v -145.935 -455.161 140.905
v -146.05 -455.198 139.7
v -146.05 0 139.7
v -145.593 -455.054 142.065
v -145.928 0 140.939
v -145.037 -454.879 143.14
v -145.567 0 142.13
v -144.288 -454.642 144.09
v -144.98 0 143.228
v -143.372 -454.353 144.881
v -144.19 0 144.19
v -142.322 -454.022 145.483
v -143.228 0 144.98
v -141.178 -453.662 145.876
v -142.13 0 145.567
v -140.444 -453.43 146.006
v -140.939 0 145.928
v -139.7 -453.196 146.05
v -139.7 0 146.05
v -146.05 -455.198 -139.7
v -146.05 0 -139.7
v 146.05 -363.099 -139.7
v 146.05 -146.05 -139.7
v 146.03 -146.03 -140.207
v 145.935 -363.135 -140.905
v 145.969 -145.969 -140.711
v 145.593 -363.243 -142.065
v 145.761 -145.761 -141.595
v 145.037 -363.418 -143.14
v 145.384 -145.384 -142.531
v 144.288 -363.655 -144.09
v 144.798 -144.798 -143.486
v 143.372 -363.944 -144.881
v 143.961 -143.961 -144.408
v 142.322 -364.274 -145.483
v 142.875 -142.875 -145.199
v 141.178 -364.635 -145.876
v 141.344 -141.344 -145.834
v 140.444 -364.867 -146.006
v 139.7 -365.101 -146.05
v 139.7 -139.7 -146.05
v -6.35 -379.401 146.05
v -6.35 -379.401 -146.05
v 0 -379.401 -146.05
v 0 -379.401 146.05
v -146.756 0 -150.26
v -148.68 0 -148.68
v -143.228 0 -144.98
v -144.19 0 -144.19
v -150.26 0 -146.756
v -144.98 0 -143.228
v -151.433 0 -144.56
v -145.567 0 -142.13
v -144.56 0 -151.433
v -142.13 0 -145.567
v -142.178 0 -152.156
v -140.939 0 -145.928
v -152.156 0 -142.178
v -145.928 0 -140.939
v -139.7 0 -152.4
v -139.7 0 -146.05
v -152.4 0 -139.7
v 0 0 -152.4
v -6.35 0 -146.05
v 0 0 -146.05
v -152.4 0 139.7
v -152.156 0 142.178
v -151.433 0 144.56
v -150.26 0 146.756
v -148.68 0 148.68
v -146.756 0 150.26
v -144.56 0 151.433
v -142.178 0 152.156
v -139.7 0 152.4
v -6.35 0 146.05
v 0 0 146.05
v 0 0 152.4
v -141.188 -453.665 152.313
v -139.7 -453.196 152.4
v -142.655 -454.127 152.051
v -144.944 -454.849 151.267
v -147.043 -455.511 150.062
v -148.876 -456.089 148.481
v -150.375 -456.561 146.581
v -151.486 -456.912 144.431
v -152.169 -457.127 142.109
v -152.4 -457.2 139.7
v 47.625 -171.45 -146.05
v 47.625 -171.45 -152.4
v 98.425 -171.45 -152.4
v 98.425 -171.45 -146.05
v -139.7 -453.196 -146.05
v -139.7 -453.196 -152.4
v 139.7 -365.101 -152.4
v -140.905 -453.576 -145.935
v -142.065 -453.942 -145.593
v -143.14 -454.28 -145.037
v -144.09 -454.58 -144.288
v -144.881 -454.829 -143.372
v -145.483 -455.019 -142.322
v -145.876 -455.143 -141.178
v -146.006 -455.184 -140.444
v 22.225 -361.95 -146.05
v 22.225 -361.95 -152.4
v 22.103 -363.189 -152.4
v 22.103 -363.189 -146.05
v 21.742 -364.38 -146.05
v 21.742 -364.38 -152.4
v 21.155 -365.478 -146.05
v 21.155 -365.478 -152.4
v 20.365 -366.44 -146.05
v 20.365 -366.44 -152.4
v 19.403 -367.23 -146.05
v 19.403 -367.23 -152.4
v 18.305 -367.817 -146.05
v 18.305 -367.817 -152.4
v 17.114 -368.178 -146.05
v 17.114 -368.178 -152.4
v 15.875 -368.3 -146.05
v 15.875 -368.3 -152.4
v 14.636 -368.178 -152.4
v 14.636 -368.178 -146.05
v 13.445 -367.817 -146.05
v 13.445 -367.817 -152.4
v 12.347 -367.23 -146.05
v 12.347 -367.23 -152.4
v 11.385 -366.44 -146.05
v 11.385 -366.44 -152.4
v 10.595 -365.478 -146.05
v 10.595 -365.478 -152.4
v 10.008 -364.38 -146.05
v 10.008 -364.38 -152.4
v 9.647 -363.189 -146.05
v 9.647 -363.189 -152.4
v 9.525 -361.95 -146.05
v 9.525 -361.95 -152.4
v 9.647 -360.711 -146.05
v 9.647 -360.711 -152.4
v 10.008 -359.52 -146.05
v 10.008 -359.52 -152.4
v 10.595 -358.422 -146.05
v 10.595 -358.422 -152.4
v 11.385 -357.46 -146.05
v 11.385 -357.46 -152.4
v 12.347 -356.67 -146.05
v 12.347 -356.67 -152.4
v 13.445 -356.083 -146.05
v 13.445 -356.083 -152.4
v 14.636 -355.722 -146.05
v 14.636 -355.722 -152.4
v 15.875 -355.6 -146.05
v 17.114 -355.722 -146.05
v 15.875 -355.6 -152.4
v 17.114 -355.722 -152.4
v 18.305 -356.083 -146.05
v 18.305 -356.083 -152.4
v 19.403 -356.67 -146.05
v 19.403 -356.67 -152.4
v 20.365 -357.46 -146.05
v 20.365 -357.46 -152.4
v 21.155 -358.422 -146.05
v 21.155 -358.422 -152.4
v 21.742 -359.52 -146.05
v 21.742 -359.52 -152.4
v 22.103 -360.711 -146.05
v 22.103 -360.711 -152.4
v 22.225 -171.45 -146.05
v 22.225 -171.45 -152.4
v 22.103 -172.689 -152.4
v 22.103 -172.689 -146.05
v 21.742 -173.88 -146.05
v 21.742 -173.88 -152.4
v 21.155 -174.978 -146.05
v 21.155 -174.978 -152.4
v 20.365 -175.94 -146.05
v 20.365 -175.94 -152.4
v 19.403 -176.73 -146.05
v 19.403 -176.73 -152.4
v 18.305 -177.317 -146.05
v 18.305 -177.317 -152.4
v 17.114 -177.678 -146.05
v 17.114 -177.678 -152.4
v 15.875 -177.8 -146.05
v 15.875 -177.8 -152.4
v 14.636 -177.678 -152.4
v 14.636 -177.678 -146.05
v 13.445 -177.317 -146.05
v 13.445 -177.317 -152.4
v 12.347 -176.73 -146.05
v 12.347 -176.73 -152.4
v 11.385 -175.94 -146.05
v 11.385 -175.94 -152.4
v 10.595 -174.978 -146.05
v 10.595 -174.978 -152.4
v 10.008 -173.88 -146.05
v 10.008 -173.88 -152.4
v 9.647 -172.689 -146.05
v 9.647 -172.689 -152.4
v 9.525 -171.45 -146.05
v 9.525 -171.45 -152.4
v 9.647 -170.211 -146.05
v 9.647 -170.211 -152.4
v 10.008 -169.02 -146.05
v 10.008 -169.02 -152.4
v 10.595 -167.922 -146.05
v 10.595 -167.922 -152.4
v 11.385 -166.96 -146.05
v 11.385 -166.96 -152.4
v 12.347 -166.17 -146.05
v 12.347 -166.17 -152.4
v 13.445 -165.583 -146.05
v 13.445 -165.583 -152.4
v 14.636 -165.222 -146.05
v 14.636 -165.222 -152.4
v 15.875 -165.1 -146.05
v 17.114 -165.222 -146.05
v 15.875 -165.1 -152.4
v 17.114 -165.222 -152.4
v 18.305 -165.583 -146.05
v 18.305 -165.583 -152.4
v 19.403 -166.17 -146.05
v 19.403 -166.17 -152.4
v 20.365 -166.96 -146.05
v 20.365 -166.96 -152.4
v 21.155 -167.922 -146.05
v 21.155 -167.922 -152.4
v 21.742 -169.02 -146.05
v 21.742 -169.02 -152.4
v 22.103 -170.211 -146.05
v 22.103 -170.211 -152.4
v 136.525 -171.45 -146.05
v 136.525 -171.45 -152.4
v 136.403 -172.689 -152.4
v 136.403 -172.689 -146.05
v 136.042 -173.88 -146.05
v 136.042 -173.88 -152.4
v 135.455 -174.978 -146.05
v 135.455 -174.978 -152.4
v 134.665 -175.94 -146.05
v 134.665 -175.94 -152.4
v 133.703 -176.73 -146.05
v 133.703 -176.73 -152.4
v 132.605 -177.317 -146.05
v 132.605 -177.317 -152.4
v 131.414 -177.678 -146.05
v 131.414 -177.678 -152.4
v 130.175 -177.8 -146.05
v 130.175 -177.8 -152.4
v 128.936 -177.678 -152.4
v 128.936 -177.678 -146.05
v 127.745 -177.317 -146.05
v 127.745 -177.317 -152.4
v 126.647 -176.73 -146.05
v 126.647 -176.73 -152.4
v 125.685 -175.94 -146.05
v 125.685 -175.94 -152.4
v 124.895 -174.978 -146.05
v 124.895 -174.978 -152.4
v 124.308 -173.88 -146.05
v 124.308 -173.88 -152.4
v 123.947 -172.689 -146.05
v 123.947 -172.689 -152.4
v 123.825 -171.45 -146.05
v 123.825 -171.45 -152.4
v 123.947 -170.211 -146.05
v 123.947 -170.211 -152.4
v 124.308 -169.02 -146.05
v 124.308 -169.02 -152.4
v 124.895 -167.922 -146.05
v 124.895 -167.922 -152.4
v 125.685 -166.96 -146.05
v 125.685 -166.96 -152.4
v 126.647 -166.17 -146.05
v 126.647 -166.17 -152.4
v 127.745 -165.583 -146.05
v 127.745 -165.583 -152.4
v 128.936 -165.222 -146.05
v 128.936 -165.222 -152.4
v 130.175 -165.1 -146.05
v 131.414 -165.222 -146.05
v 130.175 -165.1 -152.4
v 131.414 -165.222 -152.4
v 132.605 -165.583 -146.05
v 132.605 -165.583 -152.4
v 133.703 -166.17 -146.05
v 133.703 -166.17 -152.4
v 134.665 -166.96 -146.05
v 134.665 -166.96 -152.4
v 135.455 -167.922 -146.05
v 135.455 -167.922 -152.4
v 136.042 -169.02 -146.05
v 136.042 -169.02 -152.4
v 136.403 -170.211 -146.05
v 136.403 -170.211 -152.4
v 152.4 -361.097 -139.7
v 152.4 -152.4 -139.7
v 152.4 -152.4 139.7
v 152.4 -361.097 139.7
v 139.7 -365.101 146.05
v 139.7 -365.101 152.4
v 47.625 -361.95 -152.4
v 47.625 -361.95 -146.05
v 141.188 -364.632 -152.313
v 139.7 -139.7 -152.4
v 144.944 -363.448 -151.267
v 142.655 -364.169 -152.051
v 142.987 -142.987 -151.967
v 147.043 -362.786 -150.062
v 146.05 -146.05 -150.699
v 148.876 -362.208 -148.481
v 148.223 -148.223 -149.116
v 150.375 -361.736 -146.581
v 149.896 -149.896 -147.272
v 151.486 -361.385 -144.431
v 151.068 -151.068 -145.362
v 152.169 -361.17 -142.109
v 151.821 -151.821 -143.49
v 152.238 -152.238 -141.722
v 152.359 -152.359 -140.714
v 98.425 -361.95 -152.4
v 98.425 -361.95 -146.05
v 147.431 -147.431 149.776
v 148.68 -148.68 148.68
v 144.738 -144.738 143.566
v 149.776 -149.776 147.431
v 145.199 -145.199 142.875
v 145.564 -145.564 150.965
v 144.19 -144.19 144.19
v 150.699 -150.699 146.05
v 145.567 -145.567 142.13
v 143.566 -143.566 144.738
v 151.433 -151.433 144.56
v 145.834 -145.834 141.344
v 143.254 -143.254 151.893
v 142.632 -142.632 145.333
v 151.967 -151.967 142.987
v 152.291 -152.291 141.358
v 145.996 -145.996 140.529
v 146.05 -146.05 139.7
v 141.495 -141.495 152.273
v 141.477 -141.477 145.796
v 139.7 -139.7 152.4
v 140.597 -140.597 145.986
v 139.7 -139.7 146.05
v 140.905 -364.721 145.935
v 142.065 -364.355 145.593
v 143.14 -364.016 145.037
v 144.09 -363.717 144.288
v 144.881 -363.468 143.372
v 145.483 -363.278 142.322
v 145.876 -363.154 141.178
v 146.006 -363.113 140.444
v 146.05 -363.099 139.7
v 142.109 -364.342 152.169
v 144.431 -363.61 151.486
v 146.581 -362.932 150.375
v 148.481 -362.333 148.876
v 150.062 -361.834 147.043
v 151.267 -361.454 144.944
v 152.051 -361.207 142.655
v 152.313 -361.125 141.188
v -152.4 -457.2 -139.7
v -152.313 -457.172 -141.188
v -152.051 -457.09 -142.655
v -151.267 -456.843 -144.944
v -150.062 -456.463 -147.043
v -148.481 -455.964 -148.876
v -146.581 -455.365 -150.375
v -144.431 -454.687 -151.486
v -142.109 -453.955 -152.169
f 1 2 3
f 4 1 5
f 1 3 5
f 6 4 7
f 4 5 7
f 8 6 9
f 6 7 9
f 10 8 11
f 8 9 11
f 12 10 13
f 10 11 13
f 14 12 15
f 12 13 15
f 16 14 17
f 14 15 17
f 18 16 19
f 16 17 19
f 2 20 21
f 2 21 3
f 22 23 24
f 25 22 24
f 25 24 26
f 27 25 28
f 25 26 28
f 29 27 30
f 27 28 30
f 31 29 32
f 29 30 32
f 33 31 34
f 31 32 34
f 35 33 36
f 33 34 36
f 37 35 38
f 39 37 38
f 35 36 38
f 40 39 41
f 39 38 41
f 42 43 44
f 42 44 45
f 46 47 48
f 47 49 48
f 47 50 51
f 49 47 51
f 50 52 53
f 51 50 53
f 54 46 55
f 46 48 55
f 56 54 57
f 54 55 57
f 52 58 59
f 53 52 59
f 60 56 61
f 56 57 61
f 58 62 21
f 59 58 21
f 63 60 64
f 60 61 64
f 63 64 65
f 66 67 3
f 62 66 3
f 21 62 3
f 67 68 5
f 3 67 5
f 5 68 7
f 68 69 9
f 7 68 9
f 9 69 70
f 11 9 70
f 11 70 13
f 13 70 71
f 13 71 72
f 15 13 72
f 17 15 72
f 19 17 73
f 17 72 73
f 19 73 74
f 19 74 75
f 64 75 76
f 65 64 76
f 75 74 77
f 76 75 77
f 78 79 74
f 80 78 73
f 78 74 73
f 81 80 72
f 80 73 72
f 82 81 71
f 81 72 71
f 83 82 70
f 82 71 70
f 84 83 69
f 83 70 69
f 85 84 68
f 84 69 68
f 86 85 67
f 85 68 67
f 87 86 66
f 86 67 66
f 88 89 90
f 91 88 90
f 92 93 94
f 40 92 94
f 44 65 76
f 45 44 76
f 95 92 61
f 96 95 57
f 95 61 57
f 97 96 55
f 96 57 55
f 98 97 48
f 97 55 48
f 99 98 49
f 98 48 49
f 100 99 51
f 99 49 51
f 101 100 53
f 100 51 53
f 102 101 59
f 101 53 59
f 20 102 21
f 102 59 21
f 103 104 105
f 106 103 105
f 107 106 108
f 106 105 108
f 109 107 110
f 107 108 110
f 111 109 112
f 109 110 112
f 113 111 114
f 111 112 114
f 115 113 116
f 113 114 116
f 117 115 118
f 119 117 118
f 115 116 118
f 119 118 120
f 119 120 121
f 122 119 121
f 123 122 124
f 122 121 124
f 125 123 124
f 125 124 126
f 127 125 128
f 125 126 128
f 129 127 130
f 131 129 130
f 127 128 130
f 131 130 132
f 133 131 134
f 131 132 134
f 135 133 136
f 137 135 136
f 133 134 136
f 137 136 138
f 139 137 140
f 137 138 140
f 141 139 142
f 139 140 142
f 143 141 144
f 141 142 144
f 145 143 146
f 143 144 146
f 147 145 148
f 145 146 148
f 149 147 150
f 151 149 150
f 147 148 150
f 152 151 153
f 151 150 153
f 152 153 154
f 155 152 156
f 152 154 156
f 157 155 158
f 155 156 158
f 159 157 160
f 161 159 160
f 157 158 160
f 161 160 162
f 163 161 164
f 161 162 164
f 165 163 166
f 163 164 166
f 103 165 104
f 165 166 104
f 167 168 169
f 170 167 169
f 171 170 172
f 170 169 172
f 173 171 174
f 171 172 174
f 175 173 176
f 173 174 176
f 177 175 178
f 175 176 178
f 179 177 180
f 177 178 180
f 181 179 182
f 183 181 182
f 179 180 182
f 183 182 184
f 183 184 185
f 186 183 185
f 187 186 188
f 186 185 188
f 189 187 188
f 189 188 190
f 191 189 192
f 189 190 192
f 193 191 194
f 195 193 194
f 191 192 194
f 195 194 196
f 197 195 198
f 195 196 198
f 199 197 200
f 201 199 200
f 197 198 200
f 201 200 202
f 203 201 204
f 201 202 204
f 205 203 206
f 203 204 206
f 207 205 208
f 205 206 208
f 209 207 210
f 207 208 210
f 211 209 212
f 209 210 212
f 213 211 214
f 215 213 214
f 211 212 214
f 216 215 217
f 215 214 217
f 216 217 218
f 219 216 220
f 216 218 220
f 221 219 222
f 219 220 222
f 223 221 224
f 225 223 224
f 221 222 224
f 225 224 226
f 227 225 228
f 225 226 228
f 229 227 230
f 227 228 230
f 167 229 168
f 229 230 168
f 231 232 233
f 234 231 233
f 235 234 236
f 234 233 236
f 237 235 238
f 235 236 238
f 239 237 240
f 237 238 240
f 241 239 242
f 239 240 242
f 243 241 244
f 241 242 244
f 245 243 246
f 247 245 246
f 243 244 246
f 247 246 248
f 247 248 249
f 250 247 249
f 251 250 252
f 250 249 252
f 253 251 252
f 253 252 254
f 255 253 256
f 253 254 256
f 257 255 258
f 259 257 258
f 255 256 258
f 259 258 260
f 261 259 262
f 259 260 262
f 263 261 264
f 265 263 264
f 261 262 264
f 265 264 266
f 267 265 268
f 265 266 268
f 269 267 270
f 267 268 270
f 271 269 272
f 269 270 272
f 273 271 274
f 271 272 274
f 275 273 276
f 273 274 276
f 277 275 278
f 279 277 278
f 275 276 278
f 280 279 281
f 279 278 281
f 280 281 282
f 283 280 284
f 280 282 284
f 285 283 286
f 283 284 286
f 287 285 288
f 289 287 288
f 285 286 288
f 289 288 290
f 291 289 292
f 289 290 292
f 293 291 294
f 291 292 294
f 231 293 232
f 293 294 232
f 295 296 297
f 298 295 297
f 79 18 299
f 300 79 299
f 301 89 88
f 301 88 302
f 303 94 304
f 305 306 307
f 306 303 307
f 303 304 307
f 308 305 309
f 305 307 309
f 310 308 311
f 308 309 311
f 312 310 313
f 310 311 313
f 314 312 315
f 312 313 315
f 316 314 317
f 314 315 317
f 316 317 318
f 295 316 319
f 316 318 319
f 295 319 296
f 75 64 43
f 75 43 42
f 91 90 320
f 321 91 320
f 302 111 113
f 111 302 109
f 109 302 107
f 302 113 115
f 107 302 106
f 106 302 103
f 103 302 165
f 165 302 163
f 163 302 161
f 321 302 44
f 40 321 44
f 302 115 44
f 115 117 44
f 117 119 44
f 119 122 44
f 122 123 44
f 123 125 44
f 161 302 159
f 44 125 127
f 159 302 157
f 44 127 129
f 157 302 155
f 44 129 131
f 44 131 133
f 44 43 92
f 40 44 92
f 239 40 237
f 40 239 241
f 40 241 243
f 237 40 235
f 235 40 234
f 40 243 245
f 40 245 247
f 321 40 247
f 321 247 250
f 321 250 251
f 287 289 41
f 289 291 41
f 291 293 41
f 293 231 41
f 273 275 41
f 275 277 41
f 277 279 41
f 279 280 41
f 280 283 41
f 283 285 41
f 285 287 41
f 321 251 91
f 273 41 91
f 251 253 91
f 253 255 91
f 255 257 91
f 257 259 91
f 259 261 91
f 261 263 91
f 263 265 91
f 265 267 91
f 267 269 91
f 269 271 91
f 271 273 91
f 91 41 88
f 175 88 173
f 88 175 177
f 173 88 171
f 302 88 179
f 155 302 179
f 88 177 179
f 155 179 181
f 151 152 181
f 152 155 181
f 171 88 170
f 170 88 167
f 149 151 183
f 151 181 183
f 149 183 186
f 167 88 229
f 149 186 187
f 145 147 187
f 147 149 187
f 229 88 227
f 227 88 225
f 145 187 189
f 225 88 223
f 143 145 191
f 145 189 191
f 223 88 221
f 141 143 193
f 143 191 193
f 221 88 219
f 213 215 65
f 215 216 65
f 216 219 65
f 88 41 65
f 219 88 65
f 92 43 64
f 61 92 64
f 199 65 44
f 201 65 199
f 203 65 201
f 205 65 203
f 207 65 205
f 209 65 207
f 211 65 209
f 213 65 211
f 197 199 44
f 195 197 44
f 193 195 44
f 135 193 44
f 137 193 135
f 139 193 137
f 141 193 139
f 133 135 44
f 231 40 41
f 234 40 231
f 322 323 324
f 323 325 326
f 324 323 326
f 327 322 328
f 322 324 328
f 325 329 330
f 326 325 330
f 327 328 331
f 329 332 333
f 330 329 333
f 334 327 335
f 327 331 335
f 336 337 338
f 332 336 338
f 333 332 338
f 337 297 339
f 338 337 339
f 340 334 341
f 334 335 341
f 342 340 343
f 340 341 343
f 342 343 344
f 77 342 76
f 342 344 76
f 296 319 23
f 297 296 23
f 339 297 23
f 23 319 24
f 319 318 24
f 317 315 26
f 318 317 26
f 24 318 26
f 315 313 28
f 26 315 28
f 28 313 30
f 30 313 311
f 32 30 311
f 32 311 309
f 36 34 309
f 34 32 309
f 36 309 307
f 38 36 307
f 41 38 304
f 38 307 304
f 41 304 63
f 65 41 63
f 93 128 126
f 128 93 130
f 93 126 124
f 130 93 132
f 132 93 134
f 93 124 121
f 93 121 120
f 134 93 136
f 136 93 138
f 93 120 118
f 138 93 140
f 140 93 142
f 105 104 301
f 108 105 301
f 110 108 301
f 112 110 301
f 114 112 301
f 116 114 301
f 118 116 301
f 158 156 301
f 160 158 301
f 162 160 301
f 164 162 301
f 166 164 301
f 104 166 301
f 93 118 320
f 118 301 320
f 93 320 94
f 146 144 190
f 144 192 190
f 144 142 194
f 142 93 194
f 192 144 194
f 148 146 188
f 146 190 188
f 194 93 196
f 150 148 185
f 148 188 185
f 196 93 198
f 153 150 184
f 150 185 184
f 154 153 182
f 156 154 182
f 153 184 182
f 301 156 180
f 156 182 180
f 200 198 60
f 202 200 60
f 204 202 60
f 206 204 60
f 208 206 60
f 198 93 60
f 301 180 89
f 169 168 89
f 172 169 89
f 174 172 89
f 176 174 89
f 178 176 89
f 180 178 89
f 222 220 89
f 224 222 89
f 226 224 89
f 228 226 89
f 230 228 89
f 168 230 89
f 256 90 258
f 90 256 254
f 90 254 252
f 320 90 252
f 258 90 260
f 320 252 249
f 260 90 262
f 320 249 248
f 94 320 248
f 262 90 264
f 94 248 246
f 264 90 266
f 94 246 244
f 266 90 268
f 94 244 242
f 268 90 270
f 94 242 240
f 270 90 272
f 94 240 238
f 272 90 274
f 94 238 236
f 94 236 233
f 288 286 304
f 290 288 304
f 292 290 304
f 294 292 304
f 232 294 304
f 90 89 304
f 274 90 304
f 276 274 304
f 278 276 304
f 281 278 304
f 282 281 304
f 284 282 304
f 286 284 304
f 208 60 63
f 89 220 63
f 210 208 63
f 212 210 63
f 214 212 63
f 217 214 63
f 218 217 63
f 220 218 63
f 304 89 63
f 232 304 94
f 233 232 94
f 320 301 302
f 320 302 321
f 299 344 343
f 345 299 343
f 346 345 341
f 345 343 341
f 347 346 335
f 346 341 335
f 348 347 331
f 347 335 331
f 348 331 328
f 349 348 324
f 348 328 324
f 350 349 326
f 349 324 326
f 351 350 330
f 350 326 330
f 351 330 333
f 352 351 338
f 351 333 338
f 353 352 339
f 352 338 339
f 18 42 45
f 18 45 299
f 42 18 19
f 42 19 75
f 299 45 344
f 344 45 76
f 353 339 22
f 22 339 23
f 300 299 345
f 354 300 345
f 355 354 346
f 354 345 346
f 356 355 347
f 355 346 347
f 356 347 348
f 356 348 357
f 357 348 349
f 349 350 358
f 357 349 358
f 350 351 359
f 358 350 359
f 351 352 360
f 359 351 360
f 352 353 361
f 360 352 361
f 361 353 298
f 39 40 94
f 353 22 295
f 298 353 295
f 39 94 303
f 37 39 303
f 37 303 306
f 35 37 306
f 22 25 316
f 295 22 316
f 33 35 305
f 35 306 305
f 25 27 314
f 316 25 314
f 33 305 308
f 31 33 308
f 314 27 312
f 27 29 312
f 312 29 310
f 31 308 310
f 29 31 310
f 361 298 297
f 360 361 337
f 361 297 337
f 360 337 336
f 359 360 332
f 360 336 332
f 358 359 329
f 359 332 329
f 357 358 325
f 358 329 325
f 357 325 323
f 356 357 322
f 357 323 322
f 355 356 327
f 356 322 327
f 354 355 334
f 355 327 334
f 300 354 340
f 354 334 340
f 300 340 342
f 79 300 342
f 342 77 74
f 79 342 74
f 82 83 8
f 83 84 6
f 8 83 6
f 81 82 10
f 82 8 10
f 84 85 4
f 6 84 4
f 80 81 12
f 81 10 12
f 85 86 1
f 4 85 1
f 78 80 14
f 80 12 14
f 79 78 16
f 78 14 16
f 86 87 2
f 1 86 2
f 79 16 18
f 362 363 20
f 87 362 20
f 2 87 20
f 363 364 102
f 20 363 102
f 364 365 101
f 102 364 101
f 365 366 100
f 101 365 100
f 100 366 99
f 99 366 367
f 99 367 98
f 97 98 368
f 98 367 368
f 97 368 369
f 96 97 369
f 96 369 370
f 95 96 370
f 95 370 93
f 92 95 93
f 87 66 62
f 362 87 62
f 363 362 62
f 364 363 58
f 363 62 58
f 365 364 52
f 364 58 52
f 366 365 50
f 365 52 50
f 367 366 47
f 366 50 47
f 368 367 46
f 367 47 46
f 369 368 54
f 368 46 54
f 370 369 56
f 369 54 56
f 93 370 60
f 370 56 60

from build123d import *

# Parameters (mm, degrees)
F0_W     = 6.35
F0_H     = 292.1
F1_DEPTH = 457.2
F4_DEPTH = 304.801
F2_W     = 50.8
F2_H     = 190.5
F2_R     = 6.35
F5_DEPTH = 6.35
F6_W     = 31.75
F6_H     = 292.1
F7_DEPTH = 6.35


with BuildPart() as f1:
    # F0 (on Front) → F1 (new body)
    with BuildSketch(Plane.XZ):
        with BuildLine():
            Line((-139.7, -152.4), (139.7, -152.4))
            ThreePointArc((139.7, -152.4), (148.6802561211, -148.6802561211), (152.4, -139.7))
            Line((152.4, -139.7), (152.4, 139.7))
            ThreePointArc((152.4, 139.7), (148.6802561211, 148.6802561211), (139.7, 152.4))
            Line((139.7, 152.4), (-139.7, 152.4))
            ThreePointArc((-139.7, 152.4), (-148.6802561211, 148.6802561211), (-152.4, 139.7))
            Line((-152.4, 139.7), (-152.4, -139.7))
            ThreePointArc((-152.4, -139.7), (-148.6802561211, -148.6802561211), (-139.7, -152.4))
        make_face()
        with BuildLine():
            Line((0, 146.05), (139.7, 146.05))
            ThreePointArc((139.7, 146.05), (144.1901280605, 144.1901280605), (146.05, 139.7))
            Line((146.05, 139.7), (146.05, -139.7))
            ThreePointArc((146.05, -139.7), (144.1901280605, -144.1901280605), (139.7, -146.05))
            Line((139.7, -146.05), (0, -146.05))
            Line((0, -146.05), (-6.35, -146.05))
            Line((-6.35, -146.05), (-139.7, -146.05))
            ThreePointArc((-139.7, -146.05), (-144.1901280605, -144.1901280605), (-146.05, -139.7))
            Line((-146.05, -139.7), (-146.05, 139.7))
            ThreePointArc((-146.05, 139.7), (-144.1901280605, 144.1901280605), (-139.7, 146.05))
            Line((-139.7, 146.05), (-6.35, 146.05))
            Line((-6.35, 146.05), (0, 146.05))
        make_face(mode=Mode.SUBTRACT)
        with Locations((-3.175, 0)):
            Rectangle(F0_W, F0_H)
    extrude(amount=F1_DEPTH)

    # F3 (on face) → F4 (cut, through all)
    with BuildSketch(Plane(origin=(0, 0, -152.4), x_dir=(1, 0, 0), z_dir=(0, 0, -1))):
        Polygon((152.4, 143.4197438789), (152.4, 152.4), (139.7, 139.7), (139.7, 130.7197438789), align=None)
        Polygon((139.7, 130.7197438789), (139.7, 139.7), (0, 0), (8.9802561211, 0), align=None)
        Polygon((139.7, 0), (139.7, 130.7197438789), (8.9802561211, 0), align=None)
        Polygon((152.4, 0), (152.4, 143.4197438789), (139.7, 130.7197438789), (139.7, 0), align=None)
        Polygon((139.7, 365.1012237684), (139.7, 457.2), (-139.7, 457.2), (-139.7, 453.1957053812), align=None)
        Polygon((-139.7, 453.1957053812), (-139.7, 457.2), (-152.4, 457.2), align=None)
        Polygon((152.4, 361.0969291497), (152.4, 457.2), (139.7, 457.2), (139.7, 365.1012237684), align=None)
    extrude(amount=-F4_DEPTH, mode=Mode.SUBTRACT)

    # F2 (on face) → F5 (cut)
    with BuildSketch(Plane(origin=(0, 0, -152.4), x_dir=(1, 0, 0), z_dir=(0, 0, -1))):
        with Locations((73.025, 266.7)):
            Rectangle(F2_W, F2_H)
        with Locations((15.875, 171.45)):
            Circle(F2_R)
        with Locations((130.175, 171.45)):
            Circle(F2_R)
        with Locations((15.875, 361.95)):
            Circle(F2_R)
    extrude(amount=-F5_DEPTH, mode=Mode.SUBTRACT)

    # F6 (on face) → F7 (cut, through all)
    with BuildSketch(Plane(origin=(-6.35, 0, 0), x_dir=(0, -1, 0), z_dir=(-1, 0, 0))):
        with Locations((395.2756118842, 0)):
            Rectangle(F6_W, F6_H)
    extrude(amount=-F7_DEPTH, mode=Mode.SUBTRACT)


solid = f1.part
